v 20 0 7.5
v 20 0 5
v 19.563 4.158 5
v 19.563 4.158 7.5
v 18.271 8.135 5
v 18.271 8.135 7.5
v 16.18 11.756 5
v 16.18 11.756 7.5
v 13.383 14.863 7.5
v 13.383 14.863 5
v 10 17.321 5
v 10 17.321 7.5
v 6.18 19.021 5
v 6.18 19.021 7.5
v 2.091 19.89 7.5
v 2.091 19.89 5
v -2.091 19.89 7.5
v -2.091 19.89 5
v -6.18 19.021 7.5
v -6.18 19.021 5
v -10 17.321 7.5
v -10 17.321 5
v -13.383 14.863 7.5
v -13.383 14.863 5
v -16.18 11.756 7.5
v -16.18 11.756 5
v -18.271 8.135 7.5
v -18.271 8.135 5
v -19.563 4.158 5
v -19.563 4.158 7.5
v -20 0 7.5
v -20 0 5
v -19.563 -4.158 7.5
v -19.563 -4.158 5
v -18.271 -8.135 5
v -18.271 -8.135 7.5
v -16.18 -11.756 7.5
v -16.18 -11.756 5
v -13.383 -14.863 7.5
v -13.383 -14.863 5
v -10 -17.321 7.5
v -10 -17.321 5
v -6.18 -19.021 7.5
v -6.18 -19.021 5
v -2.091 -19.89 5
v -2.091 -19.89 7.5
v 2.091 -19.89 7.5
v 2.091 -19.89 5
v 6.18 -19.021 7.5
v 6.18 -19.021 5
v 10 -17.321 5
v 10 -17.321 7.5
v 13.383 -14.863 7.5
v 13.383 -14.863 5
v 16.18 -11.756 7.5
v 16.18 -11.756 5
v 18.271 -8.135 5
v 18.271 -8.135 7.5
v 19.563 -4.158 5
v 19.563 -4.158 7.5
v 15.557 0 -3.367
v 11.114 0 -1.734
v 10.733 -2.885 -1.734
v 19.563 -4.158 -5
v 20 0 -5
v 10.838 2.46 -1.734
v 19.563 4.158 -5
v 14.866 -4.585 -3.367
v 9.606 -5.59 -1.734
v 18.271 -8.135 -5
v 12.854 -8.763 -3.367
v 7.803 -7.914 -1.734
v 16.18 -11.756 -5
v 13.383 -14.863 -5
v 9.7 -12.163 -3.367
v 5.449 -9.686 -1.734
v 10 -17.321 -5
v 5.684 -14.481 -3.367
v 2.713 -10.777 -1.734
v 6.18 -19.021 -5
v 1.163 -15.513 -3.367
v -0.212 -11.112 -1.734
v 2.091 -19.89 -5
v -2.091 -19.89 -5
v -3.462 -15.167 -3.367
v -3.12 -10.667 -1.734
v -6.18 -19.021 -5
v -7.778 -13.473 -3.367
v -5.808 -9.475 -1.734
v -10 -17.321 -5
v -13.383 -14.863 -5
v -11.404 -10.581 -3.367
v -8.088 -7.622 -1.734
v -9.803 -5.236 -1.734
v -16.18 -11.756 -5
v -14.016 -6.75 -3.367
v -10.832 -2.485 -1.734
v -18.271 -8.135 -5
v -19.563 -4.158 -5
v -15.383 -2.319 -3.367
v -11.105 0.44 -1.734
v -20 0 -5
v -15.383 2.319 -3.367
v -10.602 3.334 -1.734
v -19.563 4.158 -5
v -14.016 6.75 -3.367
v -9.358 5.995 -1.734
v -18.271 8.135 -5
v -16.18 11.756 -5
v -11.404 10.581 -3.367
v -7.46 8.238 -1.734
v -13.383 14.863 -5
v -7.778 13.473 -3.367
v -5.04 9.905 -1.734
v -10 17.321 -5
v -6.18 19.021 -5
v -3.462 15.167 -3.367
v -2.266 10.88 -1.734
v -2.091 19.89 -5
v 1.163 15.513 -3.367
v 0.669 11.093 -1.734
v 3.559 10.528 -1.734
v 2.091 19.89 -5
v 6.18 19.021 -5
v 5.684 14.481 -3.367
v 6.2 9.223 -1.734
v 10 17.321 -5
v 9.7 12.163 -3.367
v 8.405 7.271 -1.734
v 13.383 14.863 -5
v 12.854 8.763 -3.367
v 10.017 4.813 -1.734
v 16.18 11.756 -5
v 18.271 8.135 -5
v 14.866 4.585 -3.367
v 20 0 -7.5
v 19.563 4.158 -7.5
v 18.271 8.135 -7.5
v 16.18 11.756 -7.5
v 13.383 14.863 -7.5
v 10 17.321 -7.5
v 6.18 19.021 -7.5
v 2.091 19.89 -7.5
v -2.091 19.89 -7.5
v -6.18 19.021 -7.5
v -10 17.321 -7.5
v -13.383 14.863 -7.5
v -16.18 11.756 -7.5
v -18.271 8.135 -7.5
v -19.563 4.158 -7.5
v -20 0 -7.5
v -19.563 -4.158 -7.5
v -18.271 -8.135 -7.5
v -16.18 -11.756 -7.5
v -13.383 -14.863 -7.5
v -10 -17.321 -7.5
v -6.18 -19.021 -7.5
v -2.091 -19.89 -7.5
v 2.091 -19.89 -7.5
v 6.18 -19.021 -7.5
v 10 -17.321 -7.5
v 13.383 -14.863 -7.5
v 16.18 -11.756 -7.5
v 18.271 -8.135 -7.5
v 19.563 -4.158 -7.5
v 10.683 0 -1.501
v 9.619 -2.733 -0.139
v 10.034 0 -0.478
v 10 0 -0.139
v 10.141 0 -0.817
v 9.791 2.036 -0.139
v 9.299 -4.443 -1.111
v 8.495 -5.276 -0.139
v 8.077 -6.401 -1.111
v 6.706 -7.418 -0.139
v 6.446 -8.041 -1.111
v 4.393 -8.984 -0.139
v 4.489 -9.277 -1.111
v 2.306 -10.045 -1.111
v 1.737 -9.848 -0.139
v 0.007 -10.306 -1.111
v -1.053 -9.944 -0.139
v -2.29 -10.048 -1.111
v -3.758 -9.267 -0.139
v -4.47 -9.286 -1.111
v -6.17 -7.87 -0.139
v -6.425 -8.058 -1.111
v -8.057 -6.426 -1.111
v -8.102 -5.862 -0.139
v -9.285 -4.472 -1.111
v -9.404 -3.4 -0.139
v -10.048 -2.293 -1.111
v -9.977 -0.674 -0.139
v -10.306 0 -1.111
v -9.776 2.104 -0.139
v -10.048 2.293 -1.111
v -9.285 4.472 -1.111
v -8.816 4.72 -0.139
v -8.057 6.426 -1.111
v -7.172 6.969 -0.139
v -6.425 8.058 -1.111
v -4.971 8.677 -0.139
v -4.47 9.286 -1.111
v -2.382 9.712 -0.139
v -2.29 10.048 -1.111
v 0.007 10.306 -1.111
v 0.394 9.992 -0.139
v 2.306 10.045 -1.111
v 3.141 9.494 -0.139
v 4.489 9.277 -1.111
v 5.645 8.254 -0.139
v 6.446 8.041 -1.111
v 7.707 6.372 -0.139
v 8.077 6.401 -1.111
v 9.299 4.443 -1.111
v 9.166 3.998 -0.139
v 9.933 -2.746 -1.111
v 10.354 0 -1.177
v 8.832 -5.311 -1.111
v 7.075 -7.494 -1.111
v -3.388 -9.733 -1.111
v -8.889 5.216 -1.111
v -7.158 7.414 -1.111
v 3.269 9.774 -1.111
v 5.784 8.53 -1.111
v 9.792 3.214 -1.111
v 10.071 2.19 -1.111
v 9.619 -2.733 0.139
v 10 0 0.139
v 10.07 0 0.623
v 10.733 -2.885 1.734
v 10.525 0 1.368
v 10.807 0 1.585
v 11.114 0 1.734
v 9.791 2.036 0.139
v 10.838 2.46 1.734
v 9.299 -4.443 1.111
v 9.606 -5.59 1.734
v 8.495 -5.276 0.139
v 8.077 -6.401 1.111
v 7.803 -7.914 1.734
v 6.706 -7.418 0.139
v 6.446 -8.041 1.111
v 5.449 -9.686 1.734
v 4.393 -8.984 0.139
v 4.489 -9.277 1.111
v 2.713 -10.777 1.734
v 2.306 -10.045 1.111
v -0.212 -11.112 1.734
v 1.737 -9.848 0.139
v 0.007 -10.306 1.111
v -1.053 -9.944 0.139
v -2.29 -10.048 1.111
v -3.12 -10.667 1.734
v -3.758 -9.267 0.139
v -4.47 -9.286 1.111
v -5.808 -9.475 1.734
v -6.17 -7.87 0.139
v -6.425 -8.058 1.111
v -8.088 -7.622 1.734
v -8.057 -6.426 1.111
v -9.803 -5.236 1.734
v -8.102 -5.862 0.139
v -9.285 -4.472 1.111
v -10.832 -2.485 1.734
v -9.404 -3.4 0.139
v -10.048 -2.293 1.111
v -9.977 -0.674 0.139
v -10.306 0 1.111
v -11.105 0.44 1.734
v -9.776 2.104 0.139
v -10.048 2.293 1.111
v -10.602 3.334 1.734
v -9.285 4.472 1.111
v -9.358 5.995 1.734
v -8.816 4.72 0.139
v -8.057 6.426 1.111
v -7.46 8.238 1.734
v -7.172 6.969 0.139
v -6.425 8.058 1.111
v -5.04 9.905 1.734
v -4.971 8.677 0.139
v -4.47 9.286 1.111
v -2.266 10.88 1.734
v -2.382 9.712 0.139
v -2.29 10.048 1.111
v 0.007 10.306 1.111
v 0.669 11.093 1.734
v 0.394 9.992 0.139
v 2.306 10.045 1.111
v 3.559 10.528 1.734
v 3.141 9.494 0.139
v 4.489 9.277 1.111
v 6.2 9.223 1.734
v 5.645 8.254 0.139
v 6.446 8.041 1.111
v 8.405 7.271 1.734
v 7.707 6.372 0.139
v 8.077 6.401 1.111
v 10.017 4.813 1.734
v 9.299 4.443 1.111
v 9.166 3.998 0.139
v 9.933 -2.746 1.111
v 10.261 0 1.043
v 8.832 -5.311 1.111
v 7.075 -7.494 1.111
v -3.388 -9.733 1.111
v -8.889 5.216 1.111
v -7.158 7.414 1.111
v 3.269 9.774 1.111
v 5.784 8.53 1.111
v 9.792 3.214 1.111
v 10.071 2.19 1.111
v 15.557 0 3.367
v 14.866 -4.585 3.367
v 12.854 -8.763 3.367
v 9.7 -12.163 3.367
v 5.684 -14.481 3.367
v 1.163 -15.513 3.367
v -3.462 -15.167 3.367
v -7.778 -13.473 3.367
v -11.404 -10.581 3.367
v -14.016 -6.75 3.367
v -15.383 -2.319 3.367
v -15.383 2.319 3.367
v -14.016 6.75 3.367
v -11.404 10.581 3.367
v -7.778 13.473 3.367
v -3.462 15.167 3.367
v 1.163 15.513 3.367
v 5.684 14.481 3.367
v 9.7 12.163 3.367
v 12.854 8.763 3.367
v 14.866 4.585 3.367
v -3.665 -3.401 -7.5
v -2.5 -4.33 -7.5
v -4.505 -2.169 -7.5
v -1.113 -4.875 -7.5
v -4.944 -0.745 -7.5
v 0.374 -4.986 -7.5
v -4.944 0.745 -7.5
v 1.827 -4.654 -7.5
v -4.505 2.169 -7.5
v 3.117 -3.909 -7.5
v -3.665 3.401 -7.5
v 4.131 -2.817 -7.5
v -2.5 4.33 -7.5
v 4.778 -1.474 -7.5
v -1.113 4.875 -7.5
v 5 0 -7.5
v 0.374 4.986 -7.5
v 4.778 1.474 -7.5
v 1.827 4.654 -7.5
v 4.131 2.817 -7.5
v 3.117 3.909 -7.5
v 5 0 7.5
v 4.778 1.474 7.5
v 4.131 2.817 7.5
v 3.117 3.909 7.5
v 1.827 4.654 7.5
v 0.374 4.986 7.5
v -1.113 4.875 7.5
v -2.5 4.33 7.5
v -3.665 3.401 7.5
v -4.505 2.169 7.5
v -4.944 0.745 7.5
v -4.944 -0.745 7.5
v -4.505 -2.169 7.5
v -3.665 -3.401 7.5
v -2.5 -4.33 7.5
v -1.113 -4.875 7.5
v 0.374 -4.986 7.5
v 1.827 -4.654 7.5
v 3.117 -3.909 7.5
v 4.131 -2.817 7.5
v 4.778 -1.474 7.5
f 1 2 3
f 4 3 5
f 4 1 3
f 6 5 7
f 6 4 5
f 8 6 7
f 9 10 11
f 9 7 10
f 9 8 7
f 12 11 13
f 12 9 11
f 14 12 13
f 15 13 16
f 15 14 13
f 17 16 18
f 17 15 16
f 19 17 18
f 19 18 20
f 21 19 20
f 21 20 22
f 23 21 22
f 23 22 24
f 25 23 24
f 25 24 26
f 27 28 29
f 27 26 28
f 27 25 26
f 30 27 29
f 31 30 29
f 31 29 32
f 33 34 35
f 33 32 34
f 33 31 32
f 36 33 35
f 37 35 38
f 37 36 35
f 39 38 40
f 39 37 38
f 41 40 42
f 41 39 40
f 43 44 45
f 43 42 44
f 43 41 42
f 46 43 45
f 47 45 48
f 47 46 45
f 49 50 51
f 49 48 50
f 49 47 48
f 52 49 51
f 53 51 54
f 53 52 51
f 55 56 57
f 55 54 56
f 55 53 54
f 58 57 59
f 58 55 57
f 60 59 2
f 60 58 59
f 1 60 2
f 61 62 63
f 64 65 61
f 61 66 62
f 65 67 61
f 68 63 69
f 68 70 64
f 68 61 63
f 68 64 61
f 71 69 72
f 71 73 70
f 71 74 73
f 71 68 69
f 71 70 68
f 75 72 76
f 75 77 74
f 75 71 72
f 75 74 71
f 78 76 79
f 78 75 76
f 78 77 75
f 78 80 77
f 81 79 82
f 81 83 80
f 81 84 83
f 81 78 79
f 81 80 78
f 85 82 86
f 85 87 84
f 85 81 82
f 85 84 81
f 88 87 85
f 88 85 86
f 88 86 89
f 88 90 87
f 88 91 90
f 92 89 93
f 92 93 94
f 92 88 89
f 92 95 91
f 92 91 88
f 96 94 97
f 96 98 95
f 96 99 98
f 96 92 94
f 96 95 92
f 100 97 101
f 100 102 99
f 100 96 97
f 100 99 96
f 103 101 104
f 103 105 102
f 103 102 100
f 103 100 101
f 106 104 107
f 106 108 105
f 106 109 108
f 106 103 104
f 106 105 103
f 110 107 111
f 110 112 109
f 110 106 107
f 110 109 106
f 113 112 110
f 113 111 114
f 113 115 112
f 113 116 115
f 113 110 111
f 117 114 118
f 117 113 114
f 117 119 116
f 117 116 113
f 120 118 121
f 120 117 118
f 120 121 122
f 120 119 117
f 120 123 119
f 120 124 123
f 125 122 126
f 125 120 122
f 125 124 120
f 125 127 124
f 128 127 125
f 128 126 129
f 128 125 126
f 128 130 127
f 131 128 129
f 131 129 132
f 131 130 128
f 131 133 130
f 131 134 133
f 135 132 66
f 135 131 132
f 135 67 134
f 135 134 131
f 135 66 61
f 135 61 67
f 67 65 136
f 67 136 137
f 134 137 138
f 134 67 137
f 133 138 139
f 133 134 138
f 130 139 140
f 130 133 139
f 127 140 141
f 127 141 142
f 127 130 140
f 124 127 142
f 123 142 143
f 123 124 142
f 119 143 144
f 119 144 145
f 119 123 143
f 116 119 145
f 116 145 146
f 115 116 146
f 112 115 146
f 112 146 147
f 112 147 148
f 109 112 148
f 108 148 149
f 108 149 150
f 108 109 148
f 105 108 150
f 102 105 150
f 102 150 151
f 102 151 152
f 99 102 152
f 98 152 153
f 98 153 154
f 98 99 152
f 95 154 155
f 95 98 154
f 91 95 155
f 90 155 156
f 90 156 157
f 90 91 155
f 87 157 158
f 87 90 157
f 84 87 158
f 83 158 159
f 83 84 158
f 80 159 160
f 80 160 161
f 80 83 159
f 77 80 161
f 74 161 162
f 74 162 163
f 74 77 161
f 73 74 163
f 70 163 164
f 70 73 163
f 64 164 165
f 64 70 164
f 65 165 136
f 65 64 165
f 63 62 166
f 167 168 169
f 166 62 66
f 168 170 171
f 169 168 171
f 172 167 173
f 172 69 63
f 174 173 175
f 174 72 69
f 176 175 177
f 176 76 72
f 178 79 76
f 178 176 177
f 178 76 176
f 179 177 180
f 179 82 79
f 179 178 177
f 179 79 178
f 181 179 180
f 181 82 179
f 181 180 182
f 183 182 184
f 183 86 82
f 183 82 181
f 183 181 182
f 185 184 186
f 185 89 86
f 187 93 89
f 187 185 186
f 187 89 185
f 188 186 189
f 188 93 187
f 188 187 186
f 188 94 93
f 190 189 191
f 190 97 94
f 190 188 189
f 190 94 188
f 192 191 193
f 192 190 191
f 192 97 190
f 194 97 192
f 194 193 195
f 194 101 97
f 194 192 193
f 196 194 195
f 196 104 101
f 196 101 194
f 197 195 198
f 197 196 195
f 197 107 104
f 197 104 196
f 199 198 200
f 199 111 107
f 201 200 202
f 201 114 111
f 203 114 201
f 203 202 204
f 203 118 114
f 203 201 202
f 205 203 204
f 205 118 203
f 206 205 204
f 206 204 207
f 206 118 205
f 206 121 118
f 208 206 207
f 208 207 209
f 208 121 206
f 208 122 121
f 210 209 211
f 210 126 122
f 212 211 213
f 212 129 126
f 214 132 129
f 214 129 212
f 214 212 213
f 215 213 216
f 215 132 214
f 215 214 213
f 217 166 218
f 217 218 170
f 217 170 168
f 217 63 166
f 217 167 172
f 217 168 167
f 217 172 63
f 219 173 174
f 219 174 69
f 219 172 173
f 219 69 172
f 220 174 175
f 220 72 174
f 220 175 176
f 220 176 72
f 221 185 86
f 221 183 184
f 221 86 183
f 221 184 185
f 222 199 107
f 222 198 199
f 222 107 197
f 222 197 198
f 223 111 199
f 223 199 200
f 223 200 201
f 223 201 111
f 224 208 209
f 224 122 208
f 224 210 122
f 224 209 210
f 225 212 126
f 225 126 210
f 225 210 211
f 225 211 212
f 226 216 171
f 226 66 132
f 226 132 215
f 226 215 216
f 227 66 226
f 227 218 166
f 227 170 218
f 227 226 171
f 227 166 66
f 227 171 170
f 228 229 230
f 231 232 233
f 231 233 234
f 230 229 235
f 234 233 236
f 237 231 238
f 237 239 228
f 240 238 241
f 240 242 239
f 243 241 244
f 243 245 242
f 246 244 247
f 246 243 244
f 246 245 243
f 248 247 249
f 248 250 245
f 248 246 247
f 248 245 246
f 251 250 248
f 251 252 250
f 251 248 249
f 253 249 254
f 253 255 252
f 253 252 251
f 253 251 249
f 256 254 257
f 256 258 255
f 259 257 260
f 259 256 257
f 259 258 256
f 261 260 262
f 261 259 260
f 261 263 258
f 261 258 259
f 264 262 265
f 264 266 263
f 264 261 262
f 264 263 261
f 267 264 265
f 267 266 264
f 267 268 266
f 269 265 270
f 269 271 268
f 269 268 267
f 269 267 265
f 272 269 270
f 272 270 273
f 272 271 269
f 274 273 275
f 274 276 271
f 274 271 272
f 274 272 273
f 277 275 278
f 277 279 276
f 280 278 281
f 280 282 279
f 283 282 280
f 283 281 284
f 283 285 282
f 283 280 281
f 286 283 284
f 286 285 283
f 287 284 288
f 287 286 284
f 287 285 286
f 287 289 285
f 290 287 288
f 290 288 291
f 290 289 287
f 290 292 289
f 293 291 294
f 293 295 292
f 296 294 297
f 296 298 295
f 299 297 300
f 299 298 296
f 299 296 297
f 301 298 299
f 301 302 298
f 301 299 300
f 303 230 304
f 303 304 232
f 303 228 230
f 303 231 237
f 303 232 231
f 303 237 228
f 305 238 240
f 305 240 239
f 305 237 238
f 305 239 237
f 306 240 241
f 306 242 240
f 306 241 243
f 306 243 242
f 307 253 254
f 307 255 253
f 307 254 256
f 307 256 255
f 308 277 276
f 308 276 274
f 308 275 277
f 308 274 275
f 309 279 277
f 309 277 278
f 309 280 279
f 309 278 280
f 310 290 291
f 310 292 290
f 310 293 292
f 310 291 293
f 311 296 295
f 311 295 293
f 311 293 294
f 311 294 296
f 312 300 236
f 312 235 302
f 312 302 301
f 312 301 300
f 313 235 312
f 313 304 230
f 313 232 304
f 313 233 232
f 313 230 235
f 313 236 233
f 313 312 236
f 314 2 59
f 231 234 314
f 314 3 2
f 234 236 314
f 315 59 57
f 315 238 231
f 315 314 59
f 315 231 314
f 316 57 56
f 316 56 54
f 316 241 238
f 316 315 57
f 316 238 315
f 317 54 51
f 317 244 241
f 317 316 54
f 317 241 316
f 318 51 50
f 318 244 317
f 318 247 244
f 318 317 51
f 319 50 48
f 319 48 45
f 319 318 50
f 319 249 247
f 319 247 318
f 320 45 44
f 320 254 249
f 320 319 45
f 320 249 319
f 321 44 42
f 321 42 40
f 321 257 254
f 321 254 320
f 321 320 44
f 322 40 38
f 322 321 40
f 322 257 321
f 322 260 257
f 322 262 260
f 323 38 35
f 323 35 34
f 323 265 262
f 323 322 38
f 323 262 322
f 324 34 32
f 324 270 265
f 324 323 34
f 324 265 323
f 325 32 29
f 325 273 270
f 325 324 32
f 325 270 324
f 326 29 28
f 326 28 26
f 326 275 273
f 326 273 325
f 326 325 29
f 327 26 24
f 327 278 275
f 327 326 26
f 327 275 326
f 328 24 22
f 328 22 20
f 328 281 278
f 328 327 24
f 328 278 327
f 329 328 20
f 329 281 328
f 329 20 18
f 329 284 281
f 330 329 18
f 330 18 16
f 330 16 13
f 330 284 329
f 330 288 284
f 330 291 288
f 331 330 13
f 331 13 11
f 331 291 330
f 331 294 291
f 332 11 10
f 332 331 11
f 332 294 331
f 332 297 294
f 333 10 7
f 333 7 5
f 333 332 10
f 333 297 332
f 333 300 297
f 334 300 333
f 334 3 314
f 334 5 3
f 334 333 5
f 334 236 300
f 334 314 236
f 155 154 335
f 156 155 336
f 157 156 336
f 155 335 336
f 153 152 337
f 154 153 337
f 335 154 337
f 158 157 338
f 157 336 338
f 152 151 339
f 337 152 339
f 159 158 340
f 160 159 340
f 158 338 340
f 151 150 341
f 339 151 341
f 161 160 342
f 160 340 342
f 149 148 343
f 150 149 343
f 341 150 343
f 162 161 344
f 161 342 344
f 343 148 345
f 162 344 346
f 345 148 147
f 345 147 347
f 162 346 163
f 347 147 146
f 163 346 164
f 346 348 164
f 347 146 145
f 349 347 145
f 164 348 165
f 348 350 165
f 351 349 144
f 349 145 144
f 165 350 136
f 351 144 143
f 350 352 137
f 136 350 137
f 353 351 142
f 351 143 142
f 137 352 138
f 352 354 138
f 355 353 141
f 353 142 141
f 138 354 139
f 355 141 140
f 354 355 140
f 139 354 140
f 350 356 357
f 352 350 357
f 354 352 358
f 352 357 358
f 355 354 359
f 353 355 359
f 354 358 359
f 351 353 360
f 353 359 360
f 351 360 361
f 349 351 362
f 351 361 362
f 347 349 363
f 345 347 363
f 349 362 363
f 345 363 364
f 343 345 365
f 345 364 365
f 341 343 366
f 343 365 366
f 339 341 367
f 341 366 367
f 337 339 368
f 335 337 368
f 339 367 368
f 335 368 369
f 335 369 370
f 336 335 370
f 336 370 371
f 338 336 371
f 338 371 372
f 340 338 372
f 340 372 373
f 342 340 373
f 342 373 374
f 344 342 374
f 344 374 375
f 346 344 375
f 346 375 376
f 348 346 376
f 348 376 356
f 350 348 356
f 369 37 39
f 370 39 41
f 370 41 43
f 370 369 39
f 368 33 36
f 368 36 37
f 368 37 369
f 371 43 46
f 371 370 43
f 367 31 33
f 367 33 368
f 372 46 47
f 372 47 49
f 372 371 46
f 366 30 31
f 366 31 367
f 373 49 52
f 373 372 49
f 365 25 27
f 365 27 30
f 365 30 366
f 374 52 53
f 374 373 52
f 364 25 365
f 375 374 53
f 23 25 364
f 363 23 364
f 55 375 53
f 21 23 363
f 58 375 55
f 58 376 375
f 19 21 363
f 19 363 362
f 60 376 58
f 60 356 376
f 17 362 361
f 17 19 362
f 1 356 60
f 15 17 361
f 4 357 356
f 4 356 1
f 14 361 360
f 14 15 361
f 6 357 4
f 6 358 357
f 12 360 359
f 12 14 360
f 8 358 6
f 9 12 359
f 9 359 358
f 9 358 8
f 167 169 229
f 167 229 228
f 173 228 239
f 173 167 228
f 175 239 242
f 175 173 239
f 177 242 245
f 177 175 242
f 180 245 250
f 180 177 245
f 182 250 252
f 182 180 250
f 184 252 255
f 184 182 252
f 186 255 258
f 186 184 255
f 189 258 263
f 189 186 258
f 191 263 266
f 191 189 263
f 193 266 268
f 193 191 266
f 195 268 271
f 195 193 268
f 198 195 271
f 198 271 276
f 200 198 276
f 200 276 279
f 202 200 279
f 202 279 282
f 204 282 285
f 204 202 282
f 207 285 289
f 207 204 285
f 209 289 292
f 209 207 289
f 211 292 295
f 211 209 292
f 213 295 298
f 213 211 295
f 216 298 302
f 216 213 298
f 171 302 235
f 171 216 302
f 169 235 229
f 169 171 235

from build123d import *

# Parameters (mm, degrees)
ESQUISSE1_R             = 20
BOSS_EXTRU_1_DEPTH      = 7.5
CONG_1_R                = 1.7
CONG_3_R                = 1.7
ESQUISSE5_R             = 5
ENL_V_MAT_EXTRU_1_DEPTH = 33.015621312


with BuildPart() as part:
    # Esquisse1 → Boss.-Extru.1 (new, symmetric)
    with BuildSketch(Plane.XY):
        Circle(ESQUISSE1_R)
    extrude(amount=BOSS_EXTRU_1_DEPTH, both=True)

    # Esquisse4 → Enlèvement de matière-Révolution1 (revolve, cut)
    with BuildSketch(Plane(origin=(0, 0, 0), x_dir=(0, 0, -1), z_dir=(1, 0, 0)), mode=Mode.PRIVATE) as enl_vement_de_mati_re_r_volution1_sk:
        Polygon((-5, 20), (-1.324936438, 10), (1.324936438, 10), (5, 20), align=None)
    revolve(enl_vement_de_mati_re_r_volution1_sk.sketch.rotate(Axis((0, 0, 15.788572615), (0, 0, -1)), 90), axis=Axis((0, 0, 15.788572615), (0, 0, -1)), mode=Mode.SUBTRACT)

    # Congé1
    cong_1_edges = [part.edges().sort_by_distance(p)[0] for p in [
        (-10, 0, -1.324936438),
    ]]
    fillet(cong_1_edges, radius=CONG_1_R)

    # Congé3
    cong_3_edges = [part.edges().sort_by_distance(p)[0] for p in [
        (-10, 0, 1.324936438),
    ]]
    fillet(cong_3_edges, radius=CONG_3_R)

    # Esquisse5 → Enlèv. mat.-Extru.1 (cut, through all)
    with BuildSketch(Plane.XY.offset(7.5)):
        Circle(ESQUISSE5_R)
    extrude(amount=-ENL_V_MAT_EXTRU_1_DEPTH, mode=Mode.SUBTRACT)


solid = part.part
